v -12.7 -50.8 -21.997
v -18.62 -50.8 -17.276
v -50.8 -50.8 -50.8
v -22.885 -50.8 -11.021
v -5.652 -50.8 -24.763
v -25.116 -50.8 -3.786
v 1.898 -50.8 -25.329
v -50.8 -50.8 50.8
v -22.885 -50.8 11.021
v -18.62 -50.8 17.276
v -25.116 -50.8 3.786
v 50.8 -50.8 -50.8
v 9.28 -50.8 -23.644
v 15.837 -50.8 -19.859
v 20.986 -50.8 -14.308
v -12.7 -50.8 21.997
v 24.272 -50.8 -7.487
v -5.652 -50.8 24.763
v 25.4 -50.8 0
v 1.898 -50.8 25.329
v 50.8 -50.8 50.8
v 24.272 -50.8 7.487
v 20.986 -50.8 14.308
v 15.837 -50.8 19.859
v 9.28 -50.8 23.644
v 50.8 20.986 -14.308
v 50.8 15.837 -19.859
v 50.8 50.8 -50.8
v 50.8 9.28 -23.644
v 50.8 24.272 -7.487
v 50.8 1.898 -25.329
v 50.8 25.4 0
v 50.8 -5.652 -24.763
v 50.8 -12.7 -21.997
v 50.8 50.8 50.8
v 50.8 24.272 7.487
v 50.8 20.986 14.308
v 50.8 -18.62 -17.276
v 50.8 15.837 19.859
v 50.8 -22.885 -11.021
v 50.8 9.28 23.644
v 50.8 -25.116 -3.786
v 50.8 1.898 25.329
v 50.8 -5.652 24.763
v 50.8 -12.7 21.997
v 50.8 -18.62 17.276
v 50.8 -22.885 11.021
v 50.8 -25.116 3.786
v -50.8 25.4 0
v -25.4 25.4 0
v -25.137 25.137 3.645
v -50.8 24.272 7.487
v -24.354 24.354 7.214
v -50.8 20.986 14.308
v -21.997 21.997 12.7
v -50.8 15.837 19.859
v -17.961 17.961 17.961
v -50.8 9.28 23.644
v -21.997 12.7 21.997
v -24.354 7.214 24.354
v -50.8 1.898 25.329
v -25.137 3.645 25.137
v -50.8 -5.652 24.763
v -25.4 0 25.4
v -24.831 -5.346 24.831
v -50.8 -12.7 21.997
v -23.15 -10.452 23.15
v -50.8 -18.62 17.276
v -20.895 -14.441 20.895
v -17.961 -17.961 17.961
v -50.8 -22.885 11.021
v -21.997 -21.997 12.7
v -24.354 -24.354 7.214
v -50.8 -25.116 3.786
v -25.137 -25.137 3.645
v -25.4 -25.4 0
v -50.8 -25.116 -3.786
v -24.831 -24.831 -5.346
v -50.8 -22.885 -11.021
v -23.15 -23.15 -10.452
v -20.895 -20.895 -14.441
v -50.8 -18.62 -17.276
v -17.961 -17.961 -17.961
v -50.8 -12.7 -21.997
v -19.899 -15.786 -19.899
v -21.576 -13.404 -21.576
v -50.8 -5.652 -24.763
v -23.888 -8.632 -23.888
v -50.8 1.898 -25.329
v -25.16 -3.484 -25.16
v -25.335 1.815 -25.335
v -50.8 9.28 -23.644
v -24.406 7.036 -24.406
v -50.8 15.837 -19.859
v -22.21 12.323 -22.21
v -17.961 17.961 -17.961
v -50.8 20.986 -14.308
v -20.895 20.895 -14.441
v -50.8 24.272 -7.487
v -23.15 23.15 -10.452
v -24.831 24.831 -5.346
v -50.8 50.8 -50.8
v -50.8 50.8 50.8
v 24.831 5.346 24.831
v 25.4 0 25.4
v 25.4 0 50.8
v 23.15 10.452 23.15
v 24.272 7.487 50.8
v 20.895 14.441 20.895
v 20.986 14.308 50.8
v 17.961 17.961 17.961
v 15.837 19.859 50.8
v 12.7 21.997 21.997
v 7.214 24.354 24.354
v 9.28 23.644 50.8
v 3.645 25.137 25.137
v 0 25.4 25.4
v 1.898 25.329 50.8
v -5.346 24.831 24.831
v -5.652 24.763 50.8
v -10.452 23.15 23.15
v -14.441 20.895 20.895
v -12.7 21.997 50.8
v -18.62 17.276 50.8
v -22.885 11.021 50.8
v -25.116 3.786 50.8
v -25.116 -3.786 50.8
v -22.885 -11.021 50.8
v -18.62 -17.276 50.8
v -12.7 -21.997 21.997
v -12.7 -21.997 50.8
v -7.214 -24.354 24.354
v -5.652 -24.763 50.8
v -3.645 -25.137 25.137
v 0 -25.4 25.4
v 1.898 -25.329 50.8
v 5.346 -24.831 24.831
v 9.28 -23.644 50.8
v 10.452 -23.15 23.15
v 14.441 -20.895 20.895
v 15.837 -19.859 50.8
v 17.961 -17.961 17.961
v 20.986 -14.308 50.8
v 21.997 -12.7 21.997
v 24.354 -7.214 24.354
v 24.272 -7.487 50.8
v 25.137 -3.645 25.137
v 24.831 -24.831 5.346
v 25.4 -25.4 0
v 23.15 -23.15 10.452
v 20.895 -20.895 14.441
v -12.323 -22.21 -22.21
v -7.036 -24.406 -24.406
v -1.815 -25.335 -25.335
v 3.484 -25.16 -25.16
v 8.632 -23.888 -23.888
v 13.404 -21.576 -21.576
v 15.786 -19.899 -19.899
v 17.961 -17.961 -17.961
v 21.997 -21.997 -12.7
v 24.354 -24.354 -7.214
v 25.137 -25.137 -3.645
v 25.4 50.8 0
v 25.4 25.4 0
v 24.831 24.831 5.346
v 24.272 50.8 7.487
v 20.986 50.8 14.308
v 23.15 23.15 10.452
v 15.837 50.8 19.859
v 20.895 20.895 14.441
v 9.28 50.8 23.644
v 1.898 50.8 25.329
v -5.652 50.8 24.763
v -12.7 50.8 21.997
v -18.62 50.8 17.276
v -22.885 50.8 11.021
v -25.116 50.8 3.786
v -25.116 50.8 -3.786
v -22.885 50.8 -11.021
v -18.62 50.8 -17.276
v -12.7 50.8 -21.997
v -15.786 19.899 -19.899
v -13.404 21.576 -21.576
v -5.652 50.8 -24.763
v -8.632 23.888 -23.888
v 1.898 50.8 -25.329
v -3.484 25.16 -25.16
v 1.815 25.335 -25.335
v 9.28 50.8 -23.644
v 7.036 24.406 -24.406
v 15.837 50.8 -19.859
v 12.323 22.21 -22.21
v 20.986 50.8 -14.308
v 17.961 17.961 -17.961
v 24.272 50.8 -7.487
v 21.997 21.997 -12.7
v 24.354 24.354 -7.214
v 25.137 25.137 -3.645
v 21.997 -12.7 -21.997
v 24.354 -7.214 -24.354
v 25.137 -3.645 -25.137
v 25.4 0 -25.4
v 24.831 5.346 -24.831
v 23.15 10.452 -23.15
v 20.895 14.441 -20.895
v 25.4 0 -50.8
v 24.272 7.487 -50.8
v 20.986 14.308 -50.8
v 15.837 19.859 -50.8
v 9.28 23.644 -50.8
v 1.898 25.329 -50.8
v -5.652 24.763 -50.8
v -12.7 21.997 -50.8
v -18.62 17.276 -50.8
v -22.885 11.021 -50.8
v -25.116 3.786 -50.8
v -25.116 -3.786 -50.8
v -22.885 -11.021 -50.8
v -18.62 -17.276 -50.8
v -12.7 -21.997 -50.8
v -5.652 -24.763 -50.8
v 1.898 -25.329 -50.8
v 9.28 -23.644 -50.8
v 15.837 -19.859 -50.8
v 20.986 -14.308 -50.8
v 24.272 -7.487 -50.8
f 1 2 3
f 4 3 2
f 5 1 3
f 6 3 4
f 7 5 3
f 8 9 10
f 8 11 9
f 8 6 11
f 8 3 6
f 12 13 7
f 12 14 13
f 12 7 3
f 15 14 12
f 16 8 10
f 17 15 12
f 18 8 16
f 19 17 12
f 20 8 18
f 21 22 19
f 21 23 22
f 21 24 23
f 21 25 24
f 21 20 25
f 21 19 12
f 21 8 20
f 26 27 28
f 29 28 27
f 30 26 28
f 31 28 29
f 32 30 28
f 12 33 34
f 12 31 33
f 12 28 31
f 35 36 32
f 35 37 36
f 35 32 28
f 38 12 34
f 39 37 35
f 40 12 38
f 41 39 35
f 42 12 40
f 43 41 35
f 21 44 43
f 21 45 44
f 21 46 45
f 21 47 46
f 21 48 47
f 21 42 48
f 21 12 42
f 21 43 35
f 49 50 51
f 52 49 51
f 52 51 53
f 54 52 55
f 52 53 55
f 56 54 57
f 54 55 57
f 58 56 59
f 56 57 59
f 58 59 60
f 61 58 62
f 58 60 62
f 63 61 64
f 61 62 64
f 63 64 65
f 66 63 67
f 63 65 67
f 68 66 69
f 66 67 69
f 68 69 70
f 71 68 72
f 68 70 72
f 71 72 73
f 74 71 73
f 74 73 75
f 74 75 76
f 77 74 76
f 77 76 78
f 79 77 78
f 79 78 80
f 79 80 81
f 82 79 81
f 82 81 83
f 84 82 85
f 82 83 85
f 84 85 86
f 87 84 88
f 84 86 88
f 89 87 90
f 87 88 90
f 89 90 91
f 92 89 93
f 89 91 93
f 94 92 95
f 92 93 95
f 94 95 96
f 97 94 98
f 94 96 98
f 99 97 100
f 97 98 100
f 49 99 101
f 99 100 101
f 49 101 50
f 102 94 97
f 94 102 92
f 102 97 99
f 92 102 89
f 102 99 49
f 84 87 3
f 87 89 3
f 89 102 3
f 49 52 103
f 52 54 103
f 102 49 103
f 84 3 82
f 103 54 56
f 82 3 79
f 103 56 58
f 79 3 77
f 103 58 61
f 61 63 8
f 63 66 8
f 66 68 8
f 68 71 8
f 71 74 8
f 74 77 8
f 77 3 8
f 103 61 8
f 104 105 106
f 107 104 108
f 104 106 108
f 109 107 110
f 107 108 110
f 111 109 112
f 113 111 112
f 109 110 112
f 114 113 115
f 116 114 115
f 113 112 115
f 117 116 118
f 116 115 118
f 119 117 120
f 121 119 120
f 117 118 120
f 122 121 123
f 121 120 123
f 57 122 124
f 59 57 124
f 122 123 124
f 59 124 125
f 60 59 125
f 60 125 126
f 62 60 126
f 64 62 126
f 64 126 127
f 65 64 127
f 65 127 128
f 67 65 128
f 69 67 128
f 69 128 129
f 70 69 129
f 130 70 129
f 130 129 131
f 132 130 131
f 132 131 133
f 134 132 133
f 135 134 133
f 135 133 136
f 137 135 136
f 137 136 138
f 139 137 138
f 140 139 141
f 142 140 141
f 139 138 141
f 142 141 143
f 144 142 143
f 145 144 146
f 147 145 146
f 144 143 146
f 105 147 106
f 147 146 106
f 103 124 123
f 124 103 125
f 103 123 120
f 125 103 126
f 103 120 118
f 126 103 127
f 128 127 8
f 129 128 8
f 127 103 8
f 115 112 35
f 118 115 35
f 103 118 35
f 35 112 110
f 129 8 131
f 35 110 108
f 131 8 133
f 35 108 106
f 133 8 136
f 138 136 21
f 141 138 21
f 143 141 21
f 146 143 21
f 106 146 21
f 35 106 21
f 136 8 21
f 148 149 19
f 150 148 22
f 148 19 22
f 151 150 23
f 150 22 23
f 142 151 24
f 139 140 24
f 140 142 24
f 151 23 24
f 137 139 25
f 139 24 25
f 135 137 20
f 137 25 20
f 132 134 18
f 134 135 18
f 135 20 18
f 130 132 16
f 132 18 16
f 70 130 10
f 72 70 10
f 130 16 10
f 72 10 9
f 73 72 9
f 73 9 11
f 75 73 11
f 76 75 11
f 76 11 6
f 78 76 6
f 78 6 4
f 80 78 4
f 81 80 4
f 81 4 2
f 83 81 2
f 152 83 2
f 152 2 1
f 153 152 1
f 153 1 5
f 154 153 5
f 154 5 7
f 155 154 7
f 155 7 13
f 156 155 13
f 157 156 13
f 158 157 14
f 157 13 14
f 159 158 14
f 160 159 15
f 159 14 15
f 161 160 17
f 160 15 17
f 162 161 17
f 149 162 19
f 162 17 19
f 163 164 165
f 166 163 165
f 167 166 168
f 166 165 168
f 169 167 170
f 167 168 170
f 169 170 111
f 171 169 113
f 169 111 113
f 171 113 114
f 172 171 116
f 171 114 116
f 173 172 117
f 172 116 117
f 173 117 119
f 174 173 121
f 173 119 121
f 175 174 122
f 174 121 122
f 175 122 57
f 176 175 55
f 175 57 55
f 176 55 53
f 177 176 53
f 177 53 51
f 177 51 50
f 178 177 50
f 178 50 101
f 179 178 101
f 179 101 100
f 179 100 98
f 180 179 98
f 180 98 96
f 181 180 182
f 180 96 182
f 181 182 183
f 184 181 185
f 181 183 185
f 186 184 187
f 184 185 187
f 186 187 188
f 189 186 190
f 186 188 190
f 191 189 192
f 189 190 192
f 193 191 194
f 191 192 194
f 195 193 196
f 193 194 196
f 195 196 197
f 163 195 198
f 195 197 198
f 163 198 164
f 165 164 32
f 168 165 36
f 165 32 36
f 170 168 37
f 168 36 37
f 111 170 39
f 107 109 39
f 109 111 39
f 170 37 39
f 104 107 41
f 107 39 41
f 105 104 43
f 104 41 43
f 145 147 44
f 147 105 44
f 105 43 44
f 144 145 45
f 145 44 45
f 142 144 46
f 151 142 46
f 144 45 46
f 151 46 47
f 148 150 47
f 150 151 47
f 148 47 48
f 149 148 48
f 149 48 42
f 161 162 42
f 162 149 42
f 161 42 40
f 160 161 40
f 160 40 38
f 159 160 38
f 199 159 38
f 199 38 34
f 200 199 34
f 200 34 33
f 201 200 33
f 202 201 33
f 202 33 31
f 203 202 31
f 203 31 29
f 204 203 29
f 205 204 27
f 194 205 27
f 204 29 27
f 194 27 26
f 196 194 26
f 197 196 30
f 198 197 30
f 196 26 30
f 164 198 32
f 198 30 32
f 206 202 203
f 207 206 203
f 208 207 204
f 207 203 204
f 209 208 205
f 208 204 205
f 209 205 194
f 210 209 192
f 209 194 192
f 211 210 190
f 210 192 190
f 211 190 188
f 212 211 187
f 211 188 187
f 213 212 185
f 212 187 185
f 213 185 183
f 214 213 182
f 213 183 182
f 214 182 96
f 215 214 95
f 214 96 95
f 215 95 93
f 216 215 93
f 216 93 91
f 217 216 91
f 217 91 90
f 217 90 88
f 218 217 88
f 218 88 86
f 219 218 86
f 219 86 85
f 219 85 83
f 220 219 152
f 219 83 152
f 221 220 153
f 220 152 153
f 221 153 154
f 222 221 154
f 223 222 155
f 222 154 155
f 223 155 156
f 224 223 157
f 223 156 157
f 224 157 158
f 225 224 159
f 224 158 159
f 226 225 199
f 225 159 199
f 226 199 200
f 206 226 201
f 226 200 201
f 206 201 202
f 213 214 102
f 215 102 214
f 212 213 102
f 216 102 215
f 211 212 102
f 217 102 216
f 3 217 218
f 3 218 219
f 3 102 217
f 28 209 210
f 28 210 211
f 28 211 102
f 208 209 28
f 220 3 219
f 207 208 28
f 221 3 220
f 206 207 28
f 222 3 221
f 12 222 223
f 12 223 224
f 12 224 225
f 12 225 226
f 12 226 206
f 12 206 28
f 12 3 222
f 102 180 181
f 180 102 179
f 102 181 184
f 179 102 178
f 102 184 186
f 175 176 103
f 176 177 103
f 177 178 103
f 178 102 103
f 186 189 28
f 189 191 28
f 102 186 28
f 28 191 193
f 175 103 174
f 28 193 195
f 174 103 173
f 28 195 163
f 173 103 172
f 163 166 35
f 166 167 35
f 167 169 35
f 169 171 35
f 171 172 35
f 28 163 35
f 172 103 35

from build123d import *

# Parameters (mm, degrees)
F0_W     = 101.6
F0_H     = 101.6
F1_DEPTH = 50.8
F2_R     = 25.4
F3_DEPTH = 101.601
F4_R     = 25.4
F5_DEPTH = 101.601
F6_R     = 25.4
F7_DEPTH = 101.601


with BuildPart() as f1:
    # F0 (on Front) → F1 (new body, symmetric)
    with BuildSketch(Plane.XZ):
        Rectangle(F0_W, F0_H)
    extrude(amount=F1_DEPTH, both=True)

    # F2 (on face) → F3 (cut, through all)
    with BuildSketch(Plane.XY.offset(50.8)):
        Circle(F2_R)
    extrude(amount=-F3_DEPTH, mode=Mode.SUBTRACT)

    # F4 (on face) → F5 (cut, through all)
    with BuildSketch(Plane.XZ.offset(50.8)):
        Circle(F4_R)
    extrude(amount=-F5_DEPTH, mode=Mode.SUBTRACT)

    # F6 (on face) → F7 (cut, through all)
    with BuildSketch(Plane.YZ.offset(50.8)):
        Circle(F6_R)
    extrude(amount=-F7_DEPTH, mode=Mode.SUBTRACT)


solid = f1.part
